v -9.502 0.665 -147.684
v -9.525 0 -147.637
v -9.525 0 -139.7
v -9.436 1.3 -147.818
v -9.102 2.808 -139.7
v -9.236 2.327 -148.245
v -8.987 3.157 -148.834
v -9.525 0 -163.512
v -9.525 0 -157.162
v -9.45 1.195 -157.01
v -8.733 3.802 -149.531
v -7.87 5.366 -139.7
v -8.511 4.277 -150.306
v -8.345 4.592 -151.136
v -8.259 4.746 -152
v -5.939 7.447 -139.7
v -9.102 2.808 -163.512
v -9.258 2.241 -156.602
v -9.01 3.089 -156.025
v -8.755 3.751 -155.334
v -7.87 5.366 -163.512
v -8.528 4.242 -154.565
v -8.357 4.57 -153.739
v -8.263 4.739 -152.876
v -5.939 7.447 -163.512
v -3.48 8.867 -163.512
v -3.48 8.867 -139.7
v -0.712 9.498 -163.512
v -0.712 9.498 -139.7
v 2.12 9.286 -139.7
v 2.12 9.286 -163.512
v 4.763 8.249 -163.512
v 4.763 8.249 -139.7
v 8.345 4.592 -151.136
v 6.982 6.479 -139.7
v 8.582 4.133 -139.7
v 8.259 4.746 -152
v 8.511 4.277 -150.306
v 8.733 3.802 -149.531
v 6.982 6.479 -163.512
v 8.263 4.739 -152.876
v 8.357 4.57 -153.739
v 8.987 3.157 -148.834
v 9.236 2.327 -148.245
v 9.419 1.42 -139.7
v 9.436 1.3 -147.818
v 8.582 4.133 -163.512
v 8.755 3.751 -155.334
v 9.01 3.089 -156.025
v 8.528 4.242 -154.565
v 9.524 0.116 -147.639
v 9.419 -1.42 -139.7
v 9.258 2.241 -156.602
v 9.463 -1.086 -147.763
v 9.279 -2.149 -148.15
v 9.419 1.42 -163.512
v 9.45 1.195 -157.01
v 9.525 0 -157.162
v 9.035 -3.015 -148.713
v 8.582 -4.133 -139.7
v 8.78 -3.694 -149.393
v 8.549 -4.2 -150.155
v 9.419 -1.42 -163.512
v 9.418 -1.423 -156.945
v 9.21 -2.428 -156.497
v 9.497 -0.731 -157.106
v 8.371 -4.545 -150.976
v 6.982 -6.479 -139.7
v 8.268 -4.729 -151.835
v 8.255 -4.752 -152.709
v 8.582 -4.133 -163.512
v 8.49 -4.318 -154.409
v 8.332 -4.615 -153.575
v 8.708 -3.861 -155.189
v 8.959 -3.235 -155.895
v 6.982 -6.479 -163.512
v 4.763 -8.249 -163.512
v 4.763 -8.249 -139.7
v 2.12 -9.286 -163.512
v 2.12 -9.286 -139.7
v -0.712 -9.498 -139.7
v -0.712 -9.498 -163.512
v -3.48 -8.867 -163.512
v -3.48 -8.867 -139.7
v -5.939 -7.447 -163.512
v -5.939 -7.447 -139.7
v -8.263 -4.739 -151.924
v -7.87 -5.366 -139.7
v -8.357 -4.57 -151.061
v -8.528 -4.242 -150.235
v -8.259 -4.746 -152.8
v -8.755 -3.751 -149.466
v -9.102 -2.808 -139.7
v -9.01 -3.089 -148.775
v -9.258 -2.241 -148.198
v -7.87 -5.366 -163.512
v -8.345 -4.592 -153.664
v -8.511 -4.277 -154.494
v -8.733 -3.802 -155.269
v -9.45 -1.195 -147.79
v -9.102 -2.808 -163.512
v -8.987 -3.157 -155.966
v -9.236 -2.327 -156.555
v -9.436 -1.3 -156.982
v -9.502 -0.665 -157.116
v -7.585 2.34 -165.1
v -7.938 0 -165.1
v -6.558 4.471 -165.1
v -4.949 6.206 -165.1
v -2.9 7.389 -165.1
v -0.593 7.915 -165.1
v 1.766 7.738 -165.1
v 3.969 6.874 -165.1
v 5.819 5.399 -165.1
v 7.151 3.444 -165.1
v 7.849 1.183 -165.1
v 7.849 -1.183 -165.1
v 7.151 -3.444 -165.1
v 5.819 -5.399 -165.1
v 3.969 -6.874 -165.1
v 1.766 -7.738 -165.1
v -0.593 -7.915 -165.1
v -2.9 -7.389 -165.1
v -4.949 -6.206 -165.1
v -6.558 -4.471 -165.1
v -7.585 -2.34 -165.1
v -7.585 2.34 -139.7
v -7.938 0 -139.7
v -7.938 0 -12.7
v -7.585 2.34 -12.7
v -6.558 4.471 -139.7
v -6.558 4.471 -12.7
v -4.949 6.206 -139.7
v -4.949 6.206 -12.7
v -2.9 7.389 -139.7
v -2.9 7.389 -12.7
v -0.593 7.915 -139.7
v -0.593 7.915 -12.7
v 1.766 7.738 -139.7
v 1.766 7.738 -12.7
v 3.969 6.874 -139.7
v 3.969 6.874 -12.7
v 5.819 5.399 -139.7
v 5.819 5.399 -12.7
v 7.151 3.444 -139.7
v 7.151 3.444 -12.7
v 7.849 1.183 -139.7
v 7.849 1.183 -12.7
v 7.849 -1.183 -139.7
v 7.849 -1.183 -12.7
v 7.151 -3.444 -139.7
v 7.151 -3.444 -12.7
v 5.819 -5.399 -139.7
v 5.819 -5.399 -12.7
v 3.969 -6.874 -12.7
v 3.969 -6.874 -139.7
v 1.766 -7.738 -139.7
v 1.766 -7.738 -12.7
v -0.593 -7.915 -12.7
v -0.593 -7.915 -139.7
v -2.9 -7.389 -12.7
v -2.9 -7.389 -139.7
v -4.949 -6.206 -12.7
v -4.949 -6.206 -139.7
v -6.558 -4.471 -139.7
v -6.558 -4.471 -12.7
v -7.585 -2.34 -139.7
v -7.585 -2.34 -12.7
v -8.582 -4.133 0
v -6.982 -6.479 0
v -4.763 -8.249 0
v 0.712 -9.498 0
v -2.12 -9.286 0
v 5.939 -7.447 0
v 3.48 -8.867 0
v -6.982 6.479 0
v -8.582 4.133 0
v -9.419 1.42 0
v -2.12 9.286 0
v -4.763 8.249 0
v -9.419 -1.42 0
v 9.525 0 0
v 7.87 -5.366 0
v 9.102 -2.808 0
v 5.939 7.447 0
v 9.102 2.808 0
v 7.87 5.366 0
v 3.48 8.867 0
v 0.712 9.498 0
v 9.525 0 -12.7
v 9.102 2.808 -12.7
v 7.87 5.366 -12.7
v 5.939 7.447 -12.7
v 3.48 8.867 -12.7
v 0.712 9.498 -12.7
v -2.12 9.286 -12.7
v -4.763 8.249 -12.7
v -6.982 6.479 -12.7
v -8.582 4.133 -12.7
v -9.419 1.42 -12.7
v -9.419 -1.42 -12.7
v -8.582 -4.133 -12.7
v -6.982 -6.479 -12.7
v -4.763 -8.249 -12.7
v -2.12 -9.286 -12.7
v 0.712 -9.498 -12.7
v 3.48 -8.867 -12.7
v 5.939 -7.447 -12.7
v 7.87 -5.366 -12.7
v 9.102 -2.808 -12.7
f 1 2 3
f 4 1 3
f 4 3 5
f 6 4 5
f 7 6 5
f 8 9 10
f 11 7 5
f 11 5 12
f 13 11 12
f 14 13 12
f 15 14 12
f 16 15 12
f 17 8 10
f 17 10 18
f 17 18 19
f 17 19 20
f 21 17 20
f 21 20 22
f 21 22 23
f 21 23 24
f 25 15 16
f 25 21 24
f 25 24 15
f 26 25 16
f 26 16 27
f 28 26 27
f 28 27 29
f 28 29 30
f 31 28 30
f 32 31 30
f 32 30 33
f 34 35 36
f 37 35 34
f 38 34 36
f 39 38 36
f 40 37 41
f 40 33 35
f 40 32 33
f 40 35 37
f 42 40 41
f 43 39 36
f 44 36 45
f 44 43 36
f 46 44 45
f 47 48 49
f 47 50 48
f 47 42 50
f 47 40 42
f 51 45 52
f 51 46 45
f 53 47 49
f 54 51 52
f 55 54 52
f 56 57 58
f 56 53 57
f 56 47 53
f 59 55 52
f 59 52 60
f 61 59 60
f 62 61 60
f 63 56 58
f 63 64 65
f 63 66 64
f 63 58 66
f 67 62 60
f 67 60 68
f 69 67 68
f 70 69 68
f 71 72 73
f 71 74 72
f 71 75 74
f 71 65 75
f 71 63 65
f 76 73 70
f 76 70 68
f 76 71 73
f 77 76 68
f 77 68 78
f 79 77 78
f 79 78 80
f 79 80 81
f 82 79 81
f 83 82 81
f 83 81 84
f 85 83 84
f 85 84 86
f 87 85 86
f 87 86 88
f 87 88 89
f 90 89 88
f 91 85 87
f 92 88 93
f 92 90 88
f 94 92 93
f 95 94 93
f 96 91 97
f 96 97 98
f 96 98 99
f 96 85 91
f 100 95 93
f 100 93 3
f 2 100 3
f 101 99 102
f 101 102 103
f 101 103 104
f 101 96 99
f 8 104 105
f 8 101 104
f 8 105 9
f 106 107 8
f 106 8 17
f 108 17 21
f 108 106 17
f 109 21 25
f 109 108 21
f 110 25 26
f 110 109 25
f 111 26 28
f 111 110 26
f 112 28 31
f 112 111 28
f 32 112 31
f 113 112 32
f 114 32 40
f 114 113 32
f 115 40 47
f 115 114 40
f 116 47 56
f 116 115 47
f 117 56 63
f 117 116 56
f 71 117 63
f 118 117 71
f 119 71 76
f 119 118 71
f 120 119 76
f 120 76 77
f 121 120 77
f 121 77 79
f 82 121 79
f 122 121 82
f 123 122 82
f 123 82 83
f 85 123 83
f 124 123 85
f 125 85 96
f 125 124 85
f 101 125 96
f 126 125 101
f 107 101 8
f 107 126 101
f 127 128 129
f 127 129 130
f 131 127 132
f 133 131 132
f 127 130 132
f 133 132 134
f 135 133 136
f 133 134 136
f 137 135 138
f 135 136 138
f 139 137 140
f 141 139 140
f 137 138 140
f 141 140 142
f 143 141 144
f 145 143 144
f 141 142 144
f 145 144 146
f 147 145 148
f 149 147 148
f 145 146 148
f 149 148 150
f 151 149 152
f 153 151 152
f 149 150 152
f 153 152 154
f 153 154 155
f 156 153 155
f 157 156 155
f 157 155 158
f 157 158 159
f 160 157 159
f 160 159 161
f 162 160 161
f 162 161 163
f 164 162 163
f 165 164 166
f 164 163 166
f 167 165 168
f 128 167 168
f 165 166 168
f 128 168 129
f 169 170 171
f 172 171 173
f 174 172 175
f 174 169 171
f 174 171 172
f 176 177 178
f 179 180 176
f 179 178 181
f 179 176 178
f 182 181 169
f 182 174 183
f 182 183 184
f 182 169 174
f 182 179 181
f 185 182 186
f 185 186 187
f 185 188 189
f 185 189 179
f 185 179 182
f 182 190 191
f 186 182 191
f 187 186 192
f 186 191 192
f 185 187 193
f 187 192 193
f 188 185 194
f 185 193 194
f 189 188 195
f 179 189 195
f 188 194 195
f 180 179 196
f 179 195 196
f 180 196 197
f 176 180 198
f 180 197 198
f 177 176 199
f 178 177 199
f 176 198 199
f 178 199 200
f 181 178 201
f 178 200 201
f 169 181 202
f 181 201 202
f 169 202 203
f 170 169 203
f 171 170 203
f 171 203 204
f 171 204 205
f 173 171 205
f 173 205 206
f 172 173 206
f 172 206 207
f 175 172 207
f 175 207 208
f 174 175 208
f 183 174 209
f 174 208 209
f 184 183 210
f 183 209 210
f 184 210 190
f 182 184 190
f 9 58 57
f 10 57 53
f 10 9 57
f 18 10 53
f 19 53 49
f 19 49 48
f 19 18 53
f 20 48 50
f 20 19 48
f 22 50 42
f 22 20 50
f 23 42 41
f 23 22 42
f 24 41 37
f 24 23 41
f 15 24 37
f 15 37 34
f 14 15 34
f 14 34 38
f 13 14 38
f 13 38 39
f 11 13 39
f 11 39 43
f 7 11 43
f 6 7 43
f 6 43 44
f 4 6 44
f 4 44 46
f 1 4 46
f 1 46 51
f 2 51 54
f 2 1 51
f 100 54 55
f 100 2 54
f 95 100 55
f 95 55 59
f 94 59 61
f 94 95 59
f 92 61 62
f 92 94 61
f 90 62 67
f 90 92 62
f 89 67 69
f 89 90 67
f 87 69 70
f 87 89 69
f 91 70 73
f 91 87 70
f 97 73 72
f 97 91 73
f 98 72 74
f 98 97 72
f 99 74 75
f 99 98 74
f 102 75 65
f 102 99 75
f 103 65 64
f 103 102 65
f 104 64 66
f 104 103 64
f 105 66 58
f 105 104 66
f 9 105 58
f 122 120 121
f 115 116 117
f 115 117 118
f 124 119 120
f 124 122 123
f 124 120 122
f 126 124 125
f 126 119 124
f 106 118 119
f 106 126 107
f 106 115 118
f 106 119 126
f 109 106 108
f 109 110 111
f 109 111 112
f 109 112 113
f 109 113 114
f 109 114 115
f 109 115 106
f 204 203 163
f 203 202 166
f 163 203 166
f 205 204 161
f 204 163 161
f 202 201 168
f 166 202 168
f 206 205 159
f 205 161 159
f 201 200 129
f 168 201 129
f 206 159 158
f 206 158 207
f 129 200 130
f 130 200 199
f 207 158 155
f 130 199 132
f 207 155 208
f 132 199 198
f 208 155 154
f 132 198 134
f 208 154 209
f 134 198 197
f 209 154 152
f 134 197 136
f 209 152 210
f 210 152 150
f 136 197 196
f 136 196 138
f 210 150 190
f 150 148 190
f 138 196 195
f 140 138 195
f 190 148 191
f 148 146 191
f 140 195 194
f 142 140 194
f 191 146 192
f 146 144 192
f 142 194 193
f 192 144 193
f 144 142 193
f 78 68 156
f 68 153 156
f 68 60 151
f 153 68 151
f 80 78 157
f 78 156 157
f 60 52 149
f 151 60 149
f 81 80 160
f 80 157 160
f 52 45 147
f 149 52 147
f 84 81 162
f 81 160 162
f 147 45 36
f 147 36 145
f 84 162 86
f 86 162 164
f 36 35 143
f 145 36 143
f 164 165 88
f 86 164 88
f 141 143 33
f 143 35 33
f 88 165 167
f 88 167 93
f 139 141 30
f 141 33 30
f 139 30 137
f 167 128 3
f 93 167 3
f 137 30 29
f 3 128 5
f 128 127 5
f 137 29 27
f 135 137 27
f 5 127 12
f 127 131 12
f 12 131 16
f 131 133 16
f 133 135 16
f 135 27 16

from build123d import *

# Parameters (mm, degrees)
F_3DSKETCH2_R           = 9.525
BOSS_EXTRUDE1_DEPTH     = 12.7
SKETCH1_R               = 7.9375
BOSS_EXTRUDE2_DEPTH     = 127
SKETCH2_R               = 9.525
BOSS_EXTRUDE3_DEPTH     = 25.4
CHAMFER2_SIZE           = 1.5875
CUT_EXTRUDE1_DEPTH      = 166.648607751
CUT_EXTRUDE1_DEPTH_BACK = 166.648607751
SKETCH3_R               = 4.7625


with BuildPart() as part:
    # 3DSketch2 → Boss-Extrude1 (new body)
    with BuildSketch(Plane(origin=(0, 0, 0), x_dir=(-1, 0, 0), z_dir=(0, 0, -1))):
        Circle(F_3DSKETCH2_R)
    extrude(amount=BOSS_EXTRUDE1_DEPTH)

    # Sketch1 → Boss-Extrude2 (add)
    with BuildSketch(Plane(origin=(0, 0, -12.7), x_dir=(-1, 0, 0), z_dir=(0, 0, -1))):
        Circle(SKETCH1_R)
    extrude(amount=BOSS_EXTRUDE2_DEPTH)

    # Sketch2 → Boss-Extrude3 (add)
    with BuildSketch(Plane(origin=(0, 0, -139.7), x_dir=(-1, 0, 0), z_dir=(0, 0, -1))):
        Circle(SKETCH2_R)
    extrude(amount=BOSS_EXTRUDE3_DEPTH)

    # Chamfer2
    chamfer2_edges = [part.edges().sort_by_distance(p)[0] for p in [
        (9.525, 0, -165.1),
    ]]
    chamfer(chamfer2_edges, length=CHAMFER2_SIZE)

    # Sketch3 → Cut-Extrude1 (cut, two sides: drawn at the far end of the back side and taken through both)
    with BuildSketch(Plane(origin=(0, 0, 0), x_dir=(0, 0, -1), z_dir=(1, 0, 0)).offset(-CUT_EXTRUDE1_DEPTH_BACK)):
        with Locations((152.4, 0)):
            Circle(SKETCH3_R)
    extrude(amount=CUT_EXTRUDE1_DEPTH + CUT_EXTRUDE1_DEPTH_BACK, mode=Mode.SUBTRACT)


solid = part.part
